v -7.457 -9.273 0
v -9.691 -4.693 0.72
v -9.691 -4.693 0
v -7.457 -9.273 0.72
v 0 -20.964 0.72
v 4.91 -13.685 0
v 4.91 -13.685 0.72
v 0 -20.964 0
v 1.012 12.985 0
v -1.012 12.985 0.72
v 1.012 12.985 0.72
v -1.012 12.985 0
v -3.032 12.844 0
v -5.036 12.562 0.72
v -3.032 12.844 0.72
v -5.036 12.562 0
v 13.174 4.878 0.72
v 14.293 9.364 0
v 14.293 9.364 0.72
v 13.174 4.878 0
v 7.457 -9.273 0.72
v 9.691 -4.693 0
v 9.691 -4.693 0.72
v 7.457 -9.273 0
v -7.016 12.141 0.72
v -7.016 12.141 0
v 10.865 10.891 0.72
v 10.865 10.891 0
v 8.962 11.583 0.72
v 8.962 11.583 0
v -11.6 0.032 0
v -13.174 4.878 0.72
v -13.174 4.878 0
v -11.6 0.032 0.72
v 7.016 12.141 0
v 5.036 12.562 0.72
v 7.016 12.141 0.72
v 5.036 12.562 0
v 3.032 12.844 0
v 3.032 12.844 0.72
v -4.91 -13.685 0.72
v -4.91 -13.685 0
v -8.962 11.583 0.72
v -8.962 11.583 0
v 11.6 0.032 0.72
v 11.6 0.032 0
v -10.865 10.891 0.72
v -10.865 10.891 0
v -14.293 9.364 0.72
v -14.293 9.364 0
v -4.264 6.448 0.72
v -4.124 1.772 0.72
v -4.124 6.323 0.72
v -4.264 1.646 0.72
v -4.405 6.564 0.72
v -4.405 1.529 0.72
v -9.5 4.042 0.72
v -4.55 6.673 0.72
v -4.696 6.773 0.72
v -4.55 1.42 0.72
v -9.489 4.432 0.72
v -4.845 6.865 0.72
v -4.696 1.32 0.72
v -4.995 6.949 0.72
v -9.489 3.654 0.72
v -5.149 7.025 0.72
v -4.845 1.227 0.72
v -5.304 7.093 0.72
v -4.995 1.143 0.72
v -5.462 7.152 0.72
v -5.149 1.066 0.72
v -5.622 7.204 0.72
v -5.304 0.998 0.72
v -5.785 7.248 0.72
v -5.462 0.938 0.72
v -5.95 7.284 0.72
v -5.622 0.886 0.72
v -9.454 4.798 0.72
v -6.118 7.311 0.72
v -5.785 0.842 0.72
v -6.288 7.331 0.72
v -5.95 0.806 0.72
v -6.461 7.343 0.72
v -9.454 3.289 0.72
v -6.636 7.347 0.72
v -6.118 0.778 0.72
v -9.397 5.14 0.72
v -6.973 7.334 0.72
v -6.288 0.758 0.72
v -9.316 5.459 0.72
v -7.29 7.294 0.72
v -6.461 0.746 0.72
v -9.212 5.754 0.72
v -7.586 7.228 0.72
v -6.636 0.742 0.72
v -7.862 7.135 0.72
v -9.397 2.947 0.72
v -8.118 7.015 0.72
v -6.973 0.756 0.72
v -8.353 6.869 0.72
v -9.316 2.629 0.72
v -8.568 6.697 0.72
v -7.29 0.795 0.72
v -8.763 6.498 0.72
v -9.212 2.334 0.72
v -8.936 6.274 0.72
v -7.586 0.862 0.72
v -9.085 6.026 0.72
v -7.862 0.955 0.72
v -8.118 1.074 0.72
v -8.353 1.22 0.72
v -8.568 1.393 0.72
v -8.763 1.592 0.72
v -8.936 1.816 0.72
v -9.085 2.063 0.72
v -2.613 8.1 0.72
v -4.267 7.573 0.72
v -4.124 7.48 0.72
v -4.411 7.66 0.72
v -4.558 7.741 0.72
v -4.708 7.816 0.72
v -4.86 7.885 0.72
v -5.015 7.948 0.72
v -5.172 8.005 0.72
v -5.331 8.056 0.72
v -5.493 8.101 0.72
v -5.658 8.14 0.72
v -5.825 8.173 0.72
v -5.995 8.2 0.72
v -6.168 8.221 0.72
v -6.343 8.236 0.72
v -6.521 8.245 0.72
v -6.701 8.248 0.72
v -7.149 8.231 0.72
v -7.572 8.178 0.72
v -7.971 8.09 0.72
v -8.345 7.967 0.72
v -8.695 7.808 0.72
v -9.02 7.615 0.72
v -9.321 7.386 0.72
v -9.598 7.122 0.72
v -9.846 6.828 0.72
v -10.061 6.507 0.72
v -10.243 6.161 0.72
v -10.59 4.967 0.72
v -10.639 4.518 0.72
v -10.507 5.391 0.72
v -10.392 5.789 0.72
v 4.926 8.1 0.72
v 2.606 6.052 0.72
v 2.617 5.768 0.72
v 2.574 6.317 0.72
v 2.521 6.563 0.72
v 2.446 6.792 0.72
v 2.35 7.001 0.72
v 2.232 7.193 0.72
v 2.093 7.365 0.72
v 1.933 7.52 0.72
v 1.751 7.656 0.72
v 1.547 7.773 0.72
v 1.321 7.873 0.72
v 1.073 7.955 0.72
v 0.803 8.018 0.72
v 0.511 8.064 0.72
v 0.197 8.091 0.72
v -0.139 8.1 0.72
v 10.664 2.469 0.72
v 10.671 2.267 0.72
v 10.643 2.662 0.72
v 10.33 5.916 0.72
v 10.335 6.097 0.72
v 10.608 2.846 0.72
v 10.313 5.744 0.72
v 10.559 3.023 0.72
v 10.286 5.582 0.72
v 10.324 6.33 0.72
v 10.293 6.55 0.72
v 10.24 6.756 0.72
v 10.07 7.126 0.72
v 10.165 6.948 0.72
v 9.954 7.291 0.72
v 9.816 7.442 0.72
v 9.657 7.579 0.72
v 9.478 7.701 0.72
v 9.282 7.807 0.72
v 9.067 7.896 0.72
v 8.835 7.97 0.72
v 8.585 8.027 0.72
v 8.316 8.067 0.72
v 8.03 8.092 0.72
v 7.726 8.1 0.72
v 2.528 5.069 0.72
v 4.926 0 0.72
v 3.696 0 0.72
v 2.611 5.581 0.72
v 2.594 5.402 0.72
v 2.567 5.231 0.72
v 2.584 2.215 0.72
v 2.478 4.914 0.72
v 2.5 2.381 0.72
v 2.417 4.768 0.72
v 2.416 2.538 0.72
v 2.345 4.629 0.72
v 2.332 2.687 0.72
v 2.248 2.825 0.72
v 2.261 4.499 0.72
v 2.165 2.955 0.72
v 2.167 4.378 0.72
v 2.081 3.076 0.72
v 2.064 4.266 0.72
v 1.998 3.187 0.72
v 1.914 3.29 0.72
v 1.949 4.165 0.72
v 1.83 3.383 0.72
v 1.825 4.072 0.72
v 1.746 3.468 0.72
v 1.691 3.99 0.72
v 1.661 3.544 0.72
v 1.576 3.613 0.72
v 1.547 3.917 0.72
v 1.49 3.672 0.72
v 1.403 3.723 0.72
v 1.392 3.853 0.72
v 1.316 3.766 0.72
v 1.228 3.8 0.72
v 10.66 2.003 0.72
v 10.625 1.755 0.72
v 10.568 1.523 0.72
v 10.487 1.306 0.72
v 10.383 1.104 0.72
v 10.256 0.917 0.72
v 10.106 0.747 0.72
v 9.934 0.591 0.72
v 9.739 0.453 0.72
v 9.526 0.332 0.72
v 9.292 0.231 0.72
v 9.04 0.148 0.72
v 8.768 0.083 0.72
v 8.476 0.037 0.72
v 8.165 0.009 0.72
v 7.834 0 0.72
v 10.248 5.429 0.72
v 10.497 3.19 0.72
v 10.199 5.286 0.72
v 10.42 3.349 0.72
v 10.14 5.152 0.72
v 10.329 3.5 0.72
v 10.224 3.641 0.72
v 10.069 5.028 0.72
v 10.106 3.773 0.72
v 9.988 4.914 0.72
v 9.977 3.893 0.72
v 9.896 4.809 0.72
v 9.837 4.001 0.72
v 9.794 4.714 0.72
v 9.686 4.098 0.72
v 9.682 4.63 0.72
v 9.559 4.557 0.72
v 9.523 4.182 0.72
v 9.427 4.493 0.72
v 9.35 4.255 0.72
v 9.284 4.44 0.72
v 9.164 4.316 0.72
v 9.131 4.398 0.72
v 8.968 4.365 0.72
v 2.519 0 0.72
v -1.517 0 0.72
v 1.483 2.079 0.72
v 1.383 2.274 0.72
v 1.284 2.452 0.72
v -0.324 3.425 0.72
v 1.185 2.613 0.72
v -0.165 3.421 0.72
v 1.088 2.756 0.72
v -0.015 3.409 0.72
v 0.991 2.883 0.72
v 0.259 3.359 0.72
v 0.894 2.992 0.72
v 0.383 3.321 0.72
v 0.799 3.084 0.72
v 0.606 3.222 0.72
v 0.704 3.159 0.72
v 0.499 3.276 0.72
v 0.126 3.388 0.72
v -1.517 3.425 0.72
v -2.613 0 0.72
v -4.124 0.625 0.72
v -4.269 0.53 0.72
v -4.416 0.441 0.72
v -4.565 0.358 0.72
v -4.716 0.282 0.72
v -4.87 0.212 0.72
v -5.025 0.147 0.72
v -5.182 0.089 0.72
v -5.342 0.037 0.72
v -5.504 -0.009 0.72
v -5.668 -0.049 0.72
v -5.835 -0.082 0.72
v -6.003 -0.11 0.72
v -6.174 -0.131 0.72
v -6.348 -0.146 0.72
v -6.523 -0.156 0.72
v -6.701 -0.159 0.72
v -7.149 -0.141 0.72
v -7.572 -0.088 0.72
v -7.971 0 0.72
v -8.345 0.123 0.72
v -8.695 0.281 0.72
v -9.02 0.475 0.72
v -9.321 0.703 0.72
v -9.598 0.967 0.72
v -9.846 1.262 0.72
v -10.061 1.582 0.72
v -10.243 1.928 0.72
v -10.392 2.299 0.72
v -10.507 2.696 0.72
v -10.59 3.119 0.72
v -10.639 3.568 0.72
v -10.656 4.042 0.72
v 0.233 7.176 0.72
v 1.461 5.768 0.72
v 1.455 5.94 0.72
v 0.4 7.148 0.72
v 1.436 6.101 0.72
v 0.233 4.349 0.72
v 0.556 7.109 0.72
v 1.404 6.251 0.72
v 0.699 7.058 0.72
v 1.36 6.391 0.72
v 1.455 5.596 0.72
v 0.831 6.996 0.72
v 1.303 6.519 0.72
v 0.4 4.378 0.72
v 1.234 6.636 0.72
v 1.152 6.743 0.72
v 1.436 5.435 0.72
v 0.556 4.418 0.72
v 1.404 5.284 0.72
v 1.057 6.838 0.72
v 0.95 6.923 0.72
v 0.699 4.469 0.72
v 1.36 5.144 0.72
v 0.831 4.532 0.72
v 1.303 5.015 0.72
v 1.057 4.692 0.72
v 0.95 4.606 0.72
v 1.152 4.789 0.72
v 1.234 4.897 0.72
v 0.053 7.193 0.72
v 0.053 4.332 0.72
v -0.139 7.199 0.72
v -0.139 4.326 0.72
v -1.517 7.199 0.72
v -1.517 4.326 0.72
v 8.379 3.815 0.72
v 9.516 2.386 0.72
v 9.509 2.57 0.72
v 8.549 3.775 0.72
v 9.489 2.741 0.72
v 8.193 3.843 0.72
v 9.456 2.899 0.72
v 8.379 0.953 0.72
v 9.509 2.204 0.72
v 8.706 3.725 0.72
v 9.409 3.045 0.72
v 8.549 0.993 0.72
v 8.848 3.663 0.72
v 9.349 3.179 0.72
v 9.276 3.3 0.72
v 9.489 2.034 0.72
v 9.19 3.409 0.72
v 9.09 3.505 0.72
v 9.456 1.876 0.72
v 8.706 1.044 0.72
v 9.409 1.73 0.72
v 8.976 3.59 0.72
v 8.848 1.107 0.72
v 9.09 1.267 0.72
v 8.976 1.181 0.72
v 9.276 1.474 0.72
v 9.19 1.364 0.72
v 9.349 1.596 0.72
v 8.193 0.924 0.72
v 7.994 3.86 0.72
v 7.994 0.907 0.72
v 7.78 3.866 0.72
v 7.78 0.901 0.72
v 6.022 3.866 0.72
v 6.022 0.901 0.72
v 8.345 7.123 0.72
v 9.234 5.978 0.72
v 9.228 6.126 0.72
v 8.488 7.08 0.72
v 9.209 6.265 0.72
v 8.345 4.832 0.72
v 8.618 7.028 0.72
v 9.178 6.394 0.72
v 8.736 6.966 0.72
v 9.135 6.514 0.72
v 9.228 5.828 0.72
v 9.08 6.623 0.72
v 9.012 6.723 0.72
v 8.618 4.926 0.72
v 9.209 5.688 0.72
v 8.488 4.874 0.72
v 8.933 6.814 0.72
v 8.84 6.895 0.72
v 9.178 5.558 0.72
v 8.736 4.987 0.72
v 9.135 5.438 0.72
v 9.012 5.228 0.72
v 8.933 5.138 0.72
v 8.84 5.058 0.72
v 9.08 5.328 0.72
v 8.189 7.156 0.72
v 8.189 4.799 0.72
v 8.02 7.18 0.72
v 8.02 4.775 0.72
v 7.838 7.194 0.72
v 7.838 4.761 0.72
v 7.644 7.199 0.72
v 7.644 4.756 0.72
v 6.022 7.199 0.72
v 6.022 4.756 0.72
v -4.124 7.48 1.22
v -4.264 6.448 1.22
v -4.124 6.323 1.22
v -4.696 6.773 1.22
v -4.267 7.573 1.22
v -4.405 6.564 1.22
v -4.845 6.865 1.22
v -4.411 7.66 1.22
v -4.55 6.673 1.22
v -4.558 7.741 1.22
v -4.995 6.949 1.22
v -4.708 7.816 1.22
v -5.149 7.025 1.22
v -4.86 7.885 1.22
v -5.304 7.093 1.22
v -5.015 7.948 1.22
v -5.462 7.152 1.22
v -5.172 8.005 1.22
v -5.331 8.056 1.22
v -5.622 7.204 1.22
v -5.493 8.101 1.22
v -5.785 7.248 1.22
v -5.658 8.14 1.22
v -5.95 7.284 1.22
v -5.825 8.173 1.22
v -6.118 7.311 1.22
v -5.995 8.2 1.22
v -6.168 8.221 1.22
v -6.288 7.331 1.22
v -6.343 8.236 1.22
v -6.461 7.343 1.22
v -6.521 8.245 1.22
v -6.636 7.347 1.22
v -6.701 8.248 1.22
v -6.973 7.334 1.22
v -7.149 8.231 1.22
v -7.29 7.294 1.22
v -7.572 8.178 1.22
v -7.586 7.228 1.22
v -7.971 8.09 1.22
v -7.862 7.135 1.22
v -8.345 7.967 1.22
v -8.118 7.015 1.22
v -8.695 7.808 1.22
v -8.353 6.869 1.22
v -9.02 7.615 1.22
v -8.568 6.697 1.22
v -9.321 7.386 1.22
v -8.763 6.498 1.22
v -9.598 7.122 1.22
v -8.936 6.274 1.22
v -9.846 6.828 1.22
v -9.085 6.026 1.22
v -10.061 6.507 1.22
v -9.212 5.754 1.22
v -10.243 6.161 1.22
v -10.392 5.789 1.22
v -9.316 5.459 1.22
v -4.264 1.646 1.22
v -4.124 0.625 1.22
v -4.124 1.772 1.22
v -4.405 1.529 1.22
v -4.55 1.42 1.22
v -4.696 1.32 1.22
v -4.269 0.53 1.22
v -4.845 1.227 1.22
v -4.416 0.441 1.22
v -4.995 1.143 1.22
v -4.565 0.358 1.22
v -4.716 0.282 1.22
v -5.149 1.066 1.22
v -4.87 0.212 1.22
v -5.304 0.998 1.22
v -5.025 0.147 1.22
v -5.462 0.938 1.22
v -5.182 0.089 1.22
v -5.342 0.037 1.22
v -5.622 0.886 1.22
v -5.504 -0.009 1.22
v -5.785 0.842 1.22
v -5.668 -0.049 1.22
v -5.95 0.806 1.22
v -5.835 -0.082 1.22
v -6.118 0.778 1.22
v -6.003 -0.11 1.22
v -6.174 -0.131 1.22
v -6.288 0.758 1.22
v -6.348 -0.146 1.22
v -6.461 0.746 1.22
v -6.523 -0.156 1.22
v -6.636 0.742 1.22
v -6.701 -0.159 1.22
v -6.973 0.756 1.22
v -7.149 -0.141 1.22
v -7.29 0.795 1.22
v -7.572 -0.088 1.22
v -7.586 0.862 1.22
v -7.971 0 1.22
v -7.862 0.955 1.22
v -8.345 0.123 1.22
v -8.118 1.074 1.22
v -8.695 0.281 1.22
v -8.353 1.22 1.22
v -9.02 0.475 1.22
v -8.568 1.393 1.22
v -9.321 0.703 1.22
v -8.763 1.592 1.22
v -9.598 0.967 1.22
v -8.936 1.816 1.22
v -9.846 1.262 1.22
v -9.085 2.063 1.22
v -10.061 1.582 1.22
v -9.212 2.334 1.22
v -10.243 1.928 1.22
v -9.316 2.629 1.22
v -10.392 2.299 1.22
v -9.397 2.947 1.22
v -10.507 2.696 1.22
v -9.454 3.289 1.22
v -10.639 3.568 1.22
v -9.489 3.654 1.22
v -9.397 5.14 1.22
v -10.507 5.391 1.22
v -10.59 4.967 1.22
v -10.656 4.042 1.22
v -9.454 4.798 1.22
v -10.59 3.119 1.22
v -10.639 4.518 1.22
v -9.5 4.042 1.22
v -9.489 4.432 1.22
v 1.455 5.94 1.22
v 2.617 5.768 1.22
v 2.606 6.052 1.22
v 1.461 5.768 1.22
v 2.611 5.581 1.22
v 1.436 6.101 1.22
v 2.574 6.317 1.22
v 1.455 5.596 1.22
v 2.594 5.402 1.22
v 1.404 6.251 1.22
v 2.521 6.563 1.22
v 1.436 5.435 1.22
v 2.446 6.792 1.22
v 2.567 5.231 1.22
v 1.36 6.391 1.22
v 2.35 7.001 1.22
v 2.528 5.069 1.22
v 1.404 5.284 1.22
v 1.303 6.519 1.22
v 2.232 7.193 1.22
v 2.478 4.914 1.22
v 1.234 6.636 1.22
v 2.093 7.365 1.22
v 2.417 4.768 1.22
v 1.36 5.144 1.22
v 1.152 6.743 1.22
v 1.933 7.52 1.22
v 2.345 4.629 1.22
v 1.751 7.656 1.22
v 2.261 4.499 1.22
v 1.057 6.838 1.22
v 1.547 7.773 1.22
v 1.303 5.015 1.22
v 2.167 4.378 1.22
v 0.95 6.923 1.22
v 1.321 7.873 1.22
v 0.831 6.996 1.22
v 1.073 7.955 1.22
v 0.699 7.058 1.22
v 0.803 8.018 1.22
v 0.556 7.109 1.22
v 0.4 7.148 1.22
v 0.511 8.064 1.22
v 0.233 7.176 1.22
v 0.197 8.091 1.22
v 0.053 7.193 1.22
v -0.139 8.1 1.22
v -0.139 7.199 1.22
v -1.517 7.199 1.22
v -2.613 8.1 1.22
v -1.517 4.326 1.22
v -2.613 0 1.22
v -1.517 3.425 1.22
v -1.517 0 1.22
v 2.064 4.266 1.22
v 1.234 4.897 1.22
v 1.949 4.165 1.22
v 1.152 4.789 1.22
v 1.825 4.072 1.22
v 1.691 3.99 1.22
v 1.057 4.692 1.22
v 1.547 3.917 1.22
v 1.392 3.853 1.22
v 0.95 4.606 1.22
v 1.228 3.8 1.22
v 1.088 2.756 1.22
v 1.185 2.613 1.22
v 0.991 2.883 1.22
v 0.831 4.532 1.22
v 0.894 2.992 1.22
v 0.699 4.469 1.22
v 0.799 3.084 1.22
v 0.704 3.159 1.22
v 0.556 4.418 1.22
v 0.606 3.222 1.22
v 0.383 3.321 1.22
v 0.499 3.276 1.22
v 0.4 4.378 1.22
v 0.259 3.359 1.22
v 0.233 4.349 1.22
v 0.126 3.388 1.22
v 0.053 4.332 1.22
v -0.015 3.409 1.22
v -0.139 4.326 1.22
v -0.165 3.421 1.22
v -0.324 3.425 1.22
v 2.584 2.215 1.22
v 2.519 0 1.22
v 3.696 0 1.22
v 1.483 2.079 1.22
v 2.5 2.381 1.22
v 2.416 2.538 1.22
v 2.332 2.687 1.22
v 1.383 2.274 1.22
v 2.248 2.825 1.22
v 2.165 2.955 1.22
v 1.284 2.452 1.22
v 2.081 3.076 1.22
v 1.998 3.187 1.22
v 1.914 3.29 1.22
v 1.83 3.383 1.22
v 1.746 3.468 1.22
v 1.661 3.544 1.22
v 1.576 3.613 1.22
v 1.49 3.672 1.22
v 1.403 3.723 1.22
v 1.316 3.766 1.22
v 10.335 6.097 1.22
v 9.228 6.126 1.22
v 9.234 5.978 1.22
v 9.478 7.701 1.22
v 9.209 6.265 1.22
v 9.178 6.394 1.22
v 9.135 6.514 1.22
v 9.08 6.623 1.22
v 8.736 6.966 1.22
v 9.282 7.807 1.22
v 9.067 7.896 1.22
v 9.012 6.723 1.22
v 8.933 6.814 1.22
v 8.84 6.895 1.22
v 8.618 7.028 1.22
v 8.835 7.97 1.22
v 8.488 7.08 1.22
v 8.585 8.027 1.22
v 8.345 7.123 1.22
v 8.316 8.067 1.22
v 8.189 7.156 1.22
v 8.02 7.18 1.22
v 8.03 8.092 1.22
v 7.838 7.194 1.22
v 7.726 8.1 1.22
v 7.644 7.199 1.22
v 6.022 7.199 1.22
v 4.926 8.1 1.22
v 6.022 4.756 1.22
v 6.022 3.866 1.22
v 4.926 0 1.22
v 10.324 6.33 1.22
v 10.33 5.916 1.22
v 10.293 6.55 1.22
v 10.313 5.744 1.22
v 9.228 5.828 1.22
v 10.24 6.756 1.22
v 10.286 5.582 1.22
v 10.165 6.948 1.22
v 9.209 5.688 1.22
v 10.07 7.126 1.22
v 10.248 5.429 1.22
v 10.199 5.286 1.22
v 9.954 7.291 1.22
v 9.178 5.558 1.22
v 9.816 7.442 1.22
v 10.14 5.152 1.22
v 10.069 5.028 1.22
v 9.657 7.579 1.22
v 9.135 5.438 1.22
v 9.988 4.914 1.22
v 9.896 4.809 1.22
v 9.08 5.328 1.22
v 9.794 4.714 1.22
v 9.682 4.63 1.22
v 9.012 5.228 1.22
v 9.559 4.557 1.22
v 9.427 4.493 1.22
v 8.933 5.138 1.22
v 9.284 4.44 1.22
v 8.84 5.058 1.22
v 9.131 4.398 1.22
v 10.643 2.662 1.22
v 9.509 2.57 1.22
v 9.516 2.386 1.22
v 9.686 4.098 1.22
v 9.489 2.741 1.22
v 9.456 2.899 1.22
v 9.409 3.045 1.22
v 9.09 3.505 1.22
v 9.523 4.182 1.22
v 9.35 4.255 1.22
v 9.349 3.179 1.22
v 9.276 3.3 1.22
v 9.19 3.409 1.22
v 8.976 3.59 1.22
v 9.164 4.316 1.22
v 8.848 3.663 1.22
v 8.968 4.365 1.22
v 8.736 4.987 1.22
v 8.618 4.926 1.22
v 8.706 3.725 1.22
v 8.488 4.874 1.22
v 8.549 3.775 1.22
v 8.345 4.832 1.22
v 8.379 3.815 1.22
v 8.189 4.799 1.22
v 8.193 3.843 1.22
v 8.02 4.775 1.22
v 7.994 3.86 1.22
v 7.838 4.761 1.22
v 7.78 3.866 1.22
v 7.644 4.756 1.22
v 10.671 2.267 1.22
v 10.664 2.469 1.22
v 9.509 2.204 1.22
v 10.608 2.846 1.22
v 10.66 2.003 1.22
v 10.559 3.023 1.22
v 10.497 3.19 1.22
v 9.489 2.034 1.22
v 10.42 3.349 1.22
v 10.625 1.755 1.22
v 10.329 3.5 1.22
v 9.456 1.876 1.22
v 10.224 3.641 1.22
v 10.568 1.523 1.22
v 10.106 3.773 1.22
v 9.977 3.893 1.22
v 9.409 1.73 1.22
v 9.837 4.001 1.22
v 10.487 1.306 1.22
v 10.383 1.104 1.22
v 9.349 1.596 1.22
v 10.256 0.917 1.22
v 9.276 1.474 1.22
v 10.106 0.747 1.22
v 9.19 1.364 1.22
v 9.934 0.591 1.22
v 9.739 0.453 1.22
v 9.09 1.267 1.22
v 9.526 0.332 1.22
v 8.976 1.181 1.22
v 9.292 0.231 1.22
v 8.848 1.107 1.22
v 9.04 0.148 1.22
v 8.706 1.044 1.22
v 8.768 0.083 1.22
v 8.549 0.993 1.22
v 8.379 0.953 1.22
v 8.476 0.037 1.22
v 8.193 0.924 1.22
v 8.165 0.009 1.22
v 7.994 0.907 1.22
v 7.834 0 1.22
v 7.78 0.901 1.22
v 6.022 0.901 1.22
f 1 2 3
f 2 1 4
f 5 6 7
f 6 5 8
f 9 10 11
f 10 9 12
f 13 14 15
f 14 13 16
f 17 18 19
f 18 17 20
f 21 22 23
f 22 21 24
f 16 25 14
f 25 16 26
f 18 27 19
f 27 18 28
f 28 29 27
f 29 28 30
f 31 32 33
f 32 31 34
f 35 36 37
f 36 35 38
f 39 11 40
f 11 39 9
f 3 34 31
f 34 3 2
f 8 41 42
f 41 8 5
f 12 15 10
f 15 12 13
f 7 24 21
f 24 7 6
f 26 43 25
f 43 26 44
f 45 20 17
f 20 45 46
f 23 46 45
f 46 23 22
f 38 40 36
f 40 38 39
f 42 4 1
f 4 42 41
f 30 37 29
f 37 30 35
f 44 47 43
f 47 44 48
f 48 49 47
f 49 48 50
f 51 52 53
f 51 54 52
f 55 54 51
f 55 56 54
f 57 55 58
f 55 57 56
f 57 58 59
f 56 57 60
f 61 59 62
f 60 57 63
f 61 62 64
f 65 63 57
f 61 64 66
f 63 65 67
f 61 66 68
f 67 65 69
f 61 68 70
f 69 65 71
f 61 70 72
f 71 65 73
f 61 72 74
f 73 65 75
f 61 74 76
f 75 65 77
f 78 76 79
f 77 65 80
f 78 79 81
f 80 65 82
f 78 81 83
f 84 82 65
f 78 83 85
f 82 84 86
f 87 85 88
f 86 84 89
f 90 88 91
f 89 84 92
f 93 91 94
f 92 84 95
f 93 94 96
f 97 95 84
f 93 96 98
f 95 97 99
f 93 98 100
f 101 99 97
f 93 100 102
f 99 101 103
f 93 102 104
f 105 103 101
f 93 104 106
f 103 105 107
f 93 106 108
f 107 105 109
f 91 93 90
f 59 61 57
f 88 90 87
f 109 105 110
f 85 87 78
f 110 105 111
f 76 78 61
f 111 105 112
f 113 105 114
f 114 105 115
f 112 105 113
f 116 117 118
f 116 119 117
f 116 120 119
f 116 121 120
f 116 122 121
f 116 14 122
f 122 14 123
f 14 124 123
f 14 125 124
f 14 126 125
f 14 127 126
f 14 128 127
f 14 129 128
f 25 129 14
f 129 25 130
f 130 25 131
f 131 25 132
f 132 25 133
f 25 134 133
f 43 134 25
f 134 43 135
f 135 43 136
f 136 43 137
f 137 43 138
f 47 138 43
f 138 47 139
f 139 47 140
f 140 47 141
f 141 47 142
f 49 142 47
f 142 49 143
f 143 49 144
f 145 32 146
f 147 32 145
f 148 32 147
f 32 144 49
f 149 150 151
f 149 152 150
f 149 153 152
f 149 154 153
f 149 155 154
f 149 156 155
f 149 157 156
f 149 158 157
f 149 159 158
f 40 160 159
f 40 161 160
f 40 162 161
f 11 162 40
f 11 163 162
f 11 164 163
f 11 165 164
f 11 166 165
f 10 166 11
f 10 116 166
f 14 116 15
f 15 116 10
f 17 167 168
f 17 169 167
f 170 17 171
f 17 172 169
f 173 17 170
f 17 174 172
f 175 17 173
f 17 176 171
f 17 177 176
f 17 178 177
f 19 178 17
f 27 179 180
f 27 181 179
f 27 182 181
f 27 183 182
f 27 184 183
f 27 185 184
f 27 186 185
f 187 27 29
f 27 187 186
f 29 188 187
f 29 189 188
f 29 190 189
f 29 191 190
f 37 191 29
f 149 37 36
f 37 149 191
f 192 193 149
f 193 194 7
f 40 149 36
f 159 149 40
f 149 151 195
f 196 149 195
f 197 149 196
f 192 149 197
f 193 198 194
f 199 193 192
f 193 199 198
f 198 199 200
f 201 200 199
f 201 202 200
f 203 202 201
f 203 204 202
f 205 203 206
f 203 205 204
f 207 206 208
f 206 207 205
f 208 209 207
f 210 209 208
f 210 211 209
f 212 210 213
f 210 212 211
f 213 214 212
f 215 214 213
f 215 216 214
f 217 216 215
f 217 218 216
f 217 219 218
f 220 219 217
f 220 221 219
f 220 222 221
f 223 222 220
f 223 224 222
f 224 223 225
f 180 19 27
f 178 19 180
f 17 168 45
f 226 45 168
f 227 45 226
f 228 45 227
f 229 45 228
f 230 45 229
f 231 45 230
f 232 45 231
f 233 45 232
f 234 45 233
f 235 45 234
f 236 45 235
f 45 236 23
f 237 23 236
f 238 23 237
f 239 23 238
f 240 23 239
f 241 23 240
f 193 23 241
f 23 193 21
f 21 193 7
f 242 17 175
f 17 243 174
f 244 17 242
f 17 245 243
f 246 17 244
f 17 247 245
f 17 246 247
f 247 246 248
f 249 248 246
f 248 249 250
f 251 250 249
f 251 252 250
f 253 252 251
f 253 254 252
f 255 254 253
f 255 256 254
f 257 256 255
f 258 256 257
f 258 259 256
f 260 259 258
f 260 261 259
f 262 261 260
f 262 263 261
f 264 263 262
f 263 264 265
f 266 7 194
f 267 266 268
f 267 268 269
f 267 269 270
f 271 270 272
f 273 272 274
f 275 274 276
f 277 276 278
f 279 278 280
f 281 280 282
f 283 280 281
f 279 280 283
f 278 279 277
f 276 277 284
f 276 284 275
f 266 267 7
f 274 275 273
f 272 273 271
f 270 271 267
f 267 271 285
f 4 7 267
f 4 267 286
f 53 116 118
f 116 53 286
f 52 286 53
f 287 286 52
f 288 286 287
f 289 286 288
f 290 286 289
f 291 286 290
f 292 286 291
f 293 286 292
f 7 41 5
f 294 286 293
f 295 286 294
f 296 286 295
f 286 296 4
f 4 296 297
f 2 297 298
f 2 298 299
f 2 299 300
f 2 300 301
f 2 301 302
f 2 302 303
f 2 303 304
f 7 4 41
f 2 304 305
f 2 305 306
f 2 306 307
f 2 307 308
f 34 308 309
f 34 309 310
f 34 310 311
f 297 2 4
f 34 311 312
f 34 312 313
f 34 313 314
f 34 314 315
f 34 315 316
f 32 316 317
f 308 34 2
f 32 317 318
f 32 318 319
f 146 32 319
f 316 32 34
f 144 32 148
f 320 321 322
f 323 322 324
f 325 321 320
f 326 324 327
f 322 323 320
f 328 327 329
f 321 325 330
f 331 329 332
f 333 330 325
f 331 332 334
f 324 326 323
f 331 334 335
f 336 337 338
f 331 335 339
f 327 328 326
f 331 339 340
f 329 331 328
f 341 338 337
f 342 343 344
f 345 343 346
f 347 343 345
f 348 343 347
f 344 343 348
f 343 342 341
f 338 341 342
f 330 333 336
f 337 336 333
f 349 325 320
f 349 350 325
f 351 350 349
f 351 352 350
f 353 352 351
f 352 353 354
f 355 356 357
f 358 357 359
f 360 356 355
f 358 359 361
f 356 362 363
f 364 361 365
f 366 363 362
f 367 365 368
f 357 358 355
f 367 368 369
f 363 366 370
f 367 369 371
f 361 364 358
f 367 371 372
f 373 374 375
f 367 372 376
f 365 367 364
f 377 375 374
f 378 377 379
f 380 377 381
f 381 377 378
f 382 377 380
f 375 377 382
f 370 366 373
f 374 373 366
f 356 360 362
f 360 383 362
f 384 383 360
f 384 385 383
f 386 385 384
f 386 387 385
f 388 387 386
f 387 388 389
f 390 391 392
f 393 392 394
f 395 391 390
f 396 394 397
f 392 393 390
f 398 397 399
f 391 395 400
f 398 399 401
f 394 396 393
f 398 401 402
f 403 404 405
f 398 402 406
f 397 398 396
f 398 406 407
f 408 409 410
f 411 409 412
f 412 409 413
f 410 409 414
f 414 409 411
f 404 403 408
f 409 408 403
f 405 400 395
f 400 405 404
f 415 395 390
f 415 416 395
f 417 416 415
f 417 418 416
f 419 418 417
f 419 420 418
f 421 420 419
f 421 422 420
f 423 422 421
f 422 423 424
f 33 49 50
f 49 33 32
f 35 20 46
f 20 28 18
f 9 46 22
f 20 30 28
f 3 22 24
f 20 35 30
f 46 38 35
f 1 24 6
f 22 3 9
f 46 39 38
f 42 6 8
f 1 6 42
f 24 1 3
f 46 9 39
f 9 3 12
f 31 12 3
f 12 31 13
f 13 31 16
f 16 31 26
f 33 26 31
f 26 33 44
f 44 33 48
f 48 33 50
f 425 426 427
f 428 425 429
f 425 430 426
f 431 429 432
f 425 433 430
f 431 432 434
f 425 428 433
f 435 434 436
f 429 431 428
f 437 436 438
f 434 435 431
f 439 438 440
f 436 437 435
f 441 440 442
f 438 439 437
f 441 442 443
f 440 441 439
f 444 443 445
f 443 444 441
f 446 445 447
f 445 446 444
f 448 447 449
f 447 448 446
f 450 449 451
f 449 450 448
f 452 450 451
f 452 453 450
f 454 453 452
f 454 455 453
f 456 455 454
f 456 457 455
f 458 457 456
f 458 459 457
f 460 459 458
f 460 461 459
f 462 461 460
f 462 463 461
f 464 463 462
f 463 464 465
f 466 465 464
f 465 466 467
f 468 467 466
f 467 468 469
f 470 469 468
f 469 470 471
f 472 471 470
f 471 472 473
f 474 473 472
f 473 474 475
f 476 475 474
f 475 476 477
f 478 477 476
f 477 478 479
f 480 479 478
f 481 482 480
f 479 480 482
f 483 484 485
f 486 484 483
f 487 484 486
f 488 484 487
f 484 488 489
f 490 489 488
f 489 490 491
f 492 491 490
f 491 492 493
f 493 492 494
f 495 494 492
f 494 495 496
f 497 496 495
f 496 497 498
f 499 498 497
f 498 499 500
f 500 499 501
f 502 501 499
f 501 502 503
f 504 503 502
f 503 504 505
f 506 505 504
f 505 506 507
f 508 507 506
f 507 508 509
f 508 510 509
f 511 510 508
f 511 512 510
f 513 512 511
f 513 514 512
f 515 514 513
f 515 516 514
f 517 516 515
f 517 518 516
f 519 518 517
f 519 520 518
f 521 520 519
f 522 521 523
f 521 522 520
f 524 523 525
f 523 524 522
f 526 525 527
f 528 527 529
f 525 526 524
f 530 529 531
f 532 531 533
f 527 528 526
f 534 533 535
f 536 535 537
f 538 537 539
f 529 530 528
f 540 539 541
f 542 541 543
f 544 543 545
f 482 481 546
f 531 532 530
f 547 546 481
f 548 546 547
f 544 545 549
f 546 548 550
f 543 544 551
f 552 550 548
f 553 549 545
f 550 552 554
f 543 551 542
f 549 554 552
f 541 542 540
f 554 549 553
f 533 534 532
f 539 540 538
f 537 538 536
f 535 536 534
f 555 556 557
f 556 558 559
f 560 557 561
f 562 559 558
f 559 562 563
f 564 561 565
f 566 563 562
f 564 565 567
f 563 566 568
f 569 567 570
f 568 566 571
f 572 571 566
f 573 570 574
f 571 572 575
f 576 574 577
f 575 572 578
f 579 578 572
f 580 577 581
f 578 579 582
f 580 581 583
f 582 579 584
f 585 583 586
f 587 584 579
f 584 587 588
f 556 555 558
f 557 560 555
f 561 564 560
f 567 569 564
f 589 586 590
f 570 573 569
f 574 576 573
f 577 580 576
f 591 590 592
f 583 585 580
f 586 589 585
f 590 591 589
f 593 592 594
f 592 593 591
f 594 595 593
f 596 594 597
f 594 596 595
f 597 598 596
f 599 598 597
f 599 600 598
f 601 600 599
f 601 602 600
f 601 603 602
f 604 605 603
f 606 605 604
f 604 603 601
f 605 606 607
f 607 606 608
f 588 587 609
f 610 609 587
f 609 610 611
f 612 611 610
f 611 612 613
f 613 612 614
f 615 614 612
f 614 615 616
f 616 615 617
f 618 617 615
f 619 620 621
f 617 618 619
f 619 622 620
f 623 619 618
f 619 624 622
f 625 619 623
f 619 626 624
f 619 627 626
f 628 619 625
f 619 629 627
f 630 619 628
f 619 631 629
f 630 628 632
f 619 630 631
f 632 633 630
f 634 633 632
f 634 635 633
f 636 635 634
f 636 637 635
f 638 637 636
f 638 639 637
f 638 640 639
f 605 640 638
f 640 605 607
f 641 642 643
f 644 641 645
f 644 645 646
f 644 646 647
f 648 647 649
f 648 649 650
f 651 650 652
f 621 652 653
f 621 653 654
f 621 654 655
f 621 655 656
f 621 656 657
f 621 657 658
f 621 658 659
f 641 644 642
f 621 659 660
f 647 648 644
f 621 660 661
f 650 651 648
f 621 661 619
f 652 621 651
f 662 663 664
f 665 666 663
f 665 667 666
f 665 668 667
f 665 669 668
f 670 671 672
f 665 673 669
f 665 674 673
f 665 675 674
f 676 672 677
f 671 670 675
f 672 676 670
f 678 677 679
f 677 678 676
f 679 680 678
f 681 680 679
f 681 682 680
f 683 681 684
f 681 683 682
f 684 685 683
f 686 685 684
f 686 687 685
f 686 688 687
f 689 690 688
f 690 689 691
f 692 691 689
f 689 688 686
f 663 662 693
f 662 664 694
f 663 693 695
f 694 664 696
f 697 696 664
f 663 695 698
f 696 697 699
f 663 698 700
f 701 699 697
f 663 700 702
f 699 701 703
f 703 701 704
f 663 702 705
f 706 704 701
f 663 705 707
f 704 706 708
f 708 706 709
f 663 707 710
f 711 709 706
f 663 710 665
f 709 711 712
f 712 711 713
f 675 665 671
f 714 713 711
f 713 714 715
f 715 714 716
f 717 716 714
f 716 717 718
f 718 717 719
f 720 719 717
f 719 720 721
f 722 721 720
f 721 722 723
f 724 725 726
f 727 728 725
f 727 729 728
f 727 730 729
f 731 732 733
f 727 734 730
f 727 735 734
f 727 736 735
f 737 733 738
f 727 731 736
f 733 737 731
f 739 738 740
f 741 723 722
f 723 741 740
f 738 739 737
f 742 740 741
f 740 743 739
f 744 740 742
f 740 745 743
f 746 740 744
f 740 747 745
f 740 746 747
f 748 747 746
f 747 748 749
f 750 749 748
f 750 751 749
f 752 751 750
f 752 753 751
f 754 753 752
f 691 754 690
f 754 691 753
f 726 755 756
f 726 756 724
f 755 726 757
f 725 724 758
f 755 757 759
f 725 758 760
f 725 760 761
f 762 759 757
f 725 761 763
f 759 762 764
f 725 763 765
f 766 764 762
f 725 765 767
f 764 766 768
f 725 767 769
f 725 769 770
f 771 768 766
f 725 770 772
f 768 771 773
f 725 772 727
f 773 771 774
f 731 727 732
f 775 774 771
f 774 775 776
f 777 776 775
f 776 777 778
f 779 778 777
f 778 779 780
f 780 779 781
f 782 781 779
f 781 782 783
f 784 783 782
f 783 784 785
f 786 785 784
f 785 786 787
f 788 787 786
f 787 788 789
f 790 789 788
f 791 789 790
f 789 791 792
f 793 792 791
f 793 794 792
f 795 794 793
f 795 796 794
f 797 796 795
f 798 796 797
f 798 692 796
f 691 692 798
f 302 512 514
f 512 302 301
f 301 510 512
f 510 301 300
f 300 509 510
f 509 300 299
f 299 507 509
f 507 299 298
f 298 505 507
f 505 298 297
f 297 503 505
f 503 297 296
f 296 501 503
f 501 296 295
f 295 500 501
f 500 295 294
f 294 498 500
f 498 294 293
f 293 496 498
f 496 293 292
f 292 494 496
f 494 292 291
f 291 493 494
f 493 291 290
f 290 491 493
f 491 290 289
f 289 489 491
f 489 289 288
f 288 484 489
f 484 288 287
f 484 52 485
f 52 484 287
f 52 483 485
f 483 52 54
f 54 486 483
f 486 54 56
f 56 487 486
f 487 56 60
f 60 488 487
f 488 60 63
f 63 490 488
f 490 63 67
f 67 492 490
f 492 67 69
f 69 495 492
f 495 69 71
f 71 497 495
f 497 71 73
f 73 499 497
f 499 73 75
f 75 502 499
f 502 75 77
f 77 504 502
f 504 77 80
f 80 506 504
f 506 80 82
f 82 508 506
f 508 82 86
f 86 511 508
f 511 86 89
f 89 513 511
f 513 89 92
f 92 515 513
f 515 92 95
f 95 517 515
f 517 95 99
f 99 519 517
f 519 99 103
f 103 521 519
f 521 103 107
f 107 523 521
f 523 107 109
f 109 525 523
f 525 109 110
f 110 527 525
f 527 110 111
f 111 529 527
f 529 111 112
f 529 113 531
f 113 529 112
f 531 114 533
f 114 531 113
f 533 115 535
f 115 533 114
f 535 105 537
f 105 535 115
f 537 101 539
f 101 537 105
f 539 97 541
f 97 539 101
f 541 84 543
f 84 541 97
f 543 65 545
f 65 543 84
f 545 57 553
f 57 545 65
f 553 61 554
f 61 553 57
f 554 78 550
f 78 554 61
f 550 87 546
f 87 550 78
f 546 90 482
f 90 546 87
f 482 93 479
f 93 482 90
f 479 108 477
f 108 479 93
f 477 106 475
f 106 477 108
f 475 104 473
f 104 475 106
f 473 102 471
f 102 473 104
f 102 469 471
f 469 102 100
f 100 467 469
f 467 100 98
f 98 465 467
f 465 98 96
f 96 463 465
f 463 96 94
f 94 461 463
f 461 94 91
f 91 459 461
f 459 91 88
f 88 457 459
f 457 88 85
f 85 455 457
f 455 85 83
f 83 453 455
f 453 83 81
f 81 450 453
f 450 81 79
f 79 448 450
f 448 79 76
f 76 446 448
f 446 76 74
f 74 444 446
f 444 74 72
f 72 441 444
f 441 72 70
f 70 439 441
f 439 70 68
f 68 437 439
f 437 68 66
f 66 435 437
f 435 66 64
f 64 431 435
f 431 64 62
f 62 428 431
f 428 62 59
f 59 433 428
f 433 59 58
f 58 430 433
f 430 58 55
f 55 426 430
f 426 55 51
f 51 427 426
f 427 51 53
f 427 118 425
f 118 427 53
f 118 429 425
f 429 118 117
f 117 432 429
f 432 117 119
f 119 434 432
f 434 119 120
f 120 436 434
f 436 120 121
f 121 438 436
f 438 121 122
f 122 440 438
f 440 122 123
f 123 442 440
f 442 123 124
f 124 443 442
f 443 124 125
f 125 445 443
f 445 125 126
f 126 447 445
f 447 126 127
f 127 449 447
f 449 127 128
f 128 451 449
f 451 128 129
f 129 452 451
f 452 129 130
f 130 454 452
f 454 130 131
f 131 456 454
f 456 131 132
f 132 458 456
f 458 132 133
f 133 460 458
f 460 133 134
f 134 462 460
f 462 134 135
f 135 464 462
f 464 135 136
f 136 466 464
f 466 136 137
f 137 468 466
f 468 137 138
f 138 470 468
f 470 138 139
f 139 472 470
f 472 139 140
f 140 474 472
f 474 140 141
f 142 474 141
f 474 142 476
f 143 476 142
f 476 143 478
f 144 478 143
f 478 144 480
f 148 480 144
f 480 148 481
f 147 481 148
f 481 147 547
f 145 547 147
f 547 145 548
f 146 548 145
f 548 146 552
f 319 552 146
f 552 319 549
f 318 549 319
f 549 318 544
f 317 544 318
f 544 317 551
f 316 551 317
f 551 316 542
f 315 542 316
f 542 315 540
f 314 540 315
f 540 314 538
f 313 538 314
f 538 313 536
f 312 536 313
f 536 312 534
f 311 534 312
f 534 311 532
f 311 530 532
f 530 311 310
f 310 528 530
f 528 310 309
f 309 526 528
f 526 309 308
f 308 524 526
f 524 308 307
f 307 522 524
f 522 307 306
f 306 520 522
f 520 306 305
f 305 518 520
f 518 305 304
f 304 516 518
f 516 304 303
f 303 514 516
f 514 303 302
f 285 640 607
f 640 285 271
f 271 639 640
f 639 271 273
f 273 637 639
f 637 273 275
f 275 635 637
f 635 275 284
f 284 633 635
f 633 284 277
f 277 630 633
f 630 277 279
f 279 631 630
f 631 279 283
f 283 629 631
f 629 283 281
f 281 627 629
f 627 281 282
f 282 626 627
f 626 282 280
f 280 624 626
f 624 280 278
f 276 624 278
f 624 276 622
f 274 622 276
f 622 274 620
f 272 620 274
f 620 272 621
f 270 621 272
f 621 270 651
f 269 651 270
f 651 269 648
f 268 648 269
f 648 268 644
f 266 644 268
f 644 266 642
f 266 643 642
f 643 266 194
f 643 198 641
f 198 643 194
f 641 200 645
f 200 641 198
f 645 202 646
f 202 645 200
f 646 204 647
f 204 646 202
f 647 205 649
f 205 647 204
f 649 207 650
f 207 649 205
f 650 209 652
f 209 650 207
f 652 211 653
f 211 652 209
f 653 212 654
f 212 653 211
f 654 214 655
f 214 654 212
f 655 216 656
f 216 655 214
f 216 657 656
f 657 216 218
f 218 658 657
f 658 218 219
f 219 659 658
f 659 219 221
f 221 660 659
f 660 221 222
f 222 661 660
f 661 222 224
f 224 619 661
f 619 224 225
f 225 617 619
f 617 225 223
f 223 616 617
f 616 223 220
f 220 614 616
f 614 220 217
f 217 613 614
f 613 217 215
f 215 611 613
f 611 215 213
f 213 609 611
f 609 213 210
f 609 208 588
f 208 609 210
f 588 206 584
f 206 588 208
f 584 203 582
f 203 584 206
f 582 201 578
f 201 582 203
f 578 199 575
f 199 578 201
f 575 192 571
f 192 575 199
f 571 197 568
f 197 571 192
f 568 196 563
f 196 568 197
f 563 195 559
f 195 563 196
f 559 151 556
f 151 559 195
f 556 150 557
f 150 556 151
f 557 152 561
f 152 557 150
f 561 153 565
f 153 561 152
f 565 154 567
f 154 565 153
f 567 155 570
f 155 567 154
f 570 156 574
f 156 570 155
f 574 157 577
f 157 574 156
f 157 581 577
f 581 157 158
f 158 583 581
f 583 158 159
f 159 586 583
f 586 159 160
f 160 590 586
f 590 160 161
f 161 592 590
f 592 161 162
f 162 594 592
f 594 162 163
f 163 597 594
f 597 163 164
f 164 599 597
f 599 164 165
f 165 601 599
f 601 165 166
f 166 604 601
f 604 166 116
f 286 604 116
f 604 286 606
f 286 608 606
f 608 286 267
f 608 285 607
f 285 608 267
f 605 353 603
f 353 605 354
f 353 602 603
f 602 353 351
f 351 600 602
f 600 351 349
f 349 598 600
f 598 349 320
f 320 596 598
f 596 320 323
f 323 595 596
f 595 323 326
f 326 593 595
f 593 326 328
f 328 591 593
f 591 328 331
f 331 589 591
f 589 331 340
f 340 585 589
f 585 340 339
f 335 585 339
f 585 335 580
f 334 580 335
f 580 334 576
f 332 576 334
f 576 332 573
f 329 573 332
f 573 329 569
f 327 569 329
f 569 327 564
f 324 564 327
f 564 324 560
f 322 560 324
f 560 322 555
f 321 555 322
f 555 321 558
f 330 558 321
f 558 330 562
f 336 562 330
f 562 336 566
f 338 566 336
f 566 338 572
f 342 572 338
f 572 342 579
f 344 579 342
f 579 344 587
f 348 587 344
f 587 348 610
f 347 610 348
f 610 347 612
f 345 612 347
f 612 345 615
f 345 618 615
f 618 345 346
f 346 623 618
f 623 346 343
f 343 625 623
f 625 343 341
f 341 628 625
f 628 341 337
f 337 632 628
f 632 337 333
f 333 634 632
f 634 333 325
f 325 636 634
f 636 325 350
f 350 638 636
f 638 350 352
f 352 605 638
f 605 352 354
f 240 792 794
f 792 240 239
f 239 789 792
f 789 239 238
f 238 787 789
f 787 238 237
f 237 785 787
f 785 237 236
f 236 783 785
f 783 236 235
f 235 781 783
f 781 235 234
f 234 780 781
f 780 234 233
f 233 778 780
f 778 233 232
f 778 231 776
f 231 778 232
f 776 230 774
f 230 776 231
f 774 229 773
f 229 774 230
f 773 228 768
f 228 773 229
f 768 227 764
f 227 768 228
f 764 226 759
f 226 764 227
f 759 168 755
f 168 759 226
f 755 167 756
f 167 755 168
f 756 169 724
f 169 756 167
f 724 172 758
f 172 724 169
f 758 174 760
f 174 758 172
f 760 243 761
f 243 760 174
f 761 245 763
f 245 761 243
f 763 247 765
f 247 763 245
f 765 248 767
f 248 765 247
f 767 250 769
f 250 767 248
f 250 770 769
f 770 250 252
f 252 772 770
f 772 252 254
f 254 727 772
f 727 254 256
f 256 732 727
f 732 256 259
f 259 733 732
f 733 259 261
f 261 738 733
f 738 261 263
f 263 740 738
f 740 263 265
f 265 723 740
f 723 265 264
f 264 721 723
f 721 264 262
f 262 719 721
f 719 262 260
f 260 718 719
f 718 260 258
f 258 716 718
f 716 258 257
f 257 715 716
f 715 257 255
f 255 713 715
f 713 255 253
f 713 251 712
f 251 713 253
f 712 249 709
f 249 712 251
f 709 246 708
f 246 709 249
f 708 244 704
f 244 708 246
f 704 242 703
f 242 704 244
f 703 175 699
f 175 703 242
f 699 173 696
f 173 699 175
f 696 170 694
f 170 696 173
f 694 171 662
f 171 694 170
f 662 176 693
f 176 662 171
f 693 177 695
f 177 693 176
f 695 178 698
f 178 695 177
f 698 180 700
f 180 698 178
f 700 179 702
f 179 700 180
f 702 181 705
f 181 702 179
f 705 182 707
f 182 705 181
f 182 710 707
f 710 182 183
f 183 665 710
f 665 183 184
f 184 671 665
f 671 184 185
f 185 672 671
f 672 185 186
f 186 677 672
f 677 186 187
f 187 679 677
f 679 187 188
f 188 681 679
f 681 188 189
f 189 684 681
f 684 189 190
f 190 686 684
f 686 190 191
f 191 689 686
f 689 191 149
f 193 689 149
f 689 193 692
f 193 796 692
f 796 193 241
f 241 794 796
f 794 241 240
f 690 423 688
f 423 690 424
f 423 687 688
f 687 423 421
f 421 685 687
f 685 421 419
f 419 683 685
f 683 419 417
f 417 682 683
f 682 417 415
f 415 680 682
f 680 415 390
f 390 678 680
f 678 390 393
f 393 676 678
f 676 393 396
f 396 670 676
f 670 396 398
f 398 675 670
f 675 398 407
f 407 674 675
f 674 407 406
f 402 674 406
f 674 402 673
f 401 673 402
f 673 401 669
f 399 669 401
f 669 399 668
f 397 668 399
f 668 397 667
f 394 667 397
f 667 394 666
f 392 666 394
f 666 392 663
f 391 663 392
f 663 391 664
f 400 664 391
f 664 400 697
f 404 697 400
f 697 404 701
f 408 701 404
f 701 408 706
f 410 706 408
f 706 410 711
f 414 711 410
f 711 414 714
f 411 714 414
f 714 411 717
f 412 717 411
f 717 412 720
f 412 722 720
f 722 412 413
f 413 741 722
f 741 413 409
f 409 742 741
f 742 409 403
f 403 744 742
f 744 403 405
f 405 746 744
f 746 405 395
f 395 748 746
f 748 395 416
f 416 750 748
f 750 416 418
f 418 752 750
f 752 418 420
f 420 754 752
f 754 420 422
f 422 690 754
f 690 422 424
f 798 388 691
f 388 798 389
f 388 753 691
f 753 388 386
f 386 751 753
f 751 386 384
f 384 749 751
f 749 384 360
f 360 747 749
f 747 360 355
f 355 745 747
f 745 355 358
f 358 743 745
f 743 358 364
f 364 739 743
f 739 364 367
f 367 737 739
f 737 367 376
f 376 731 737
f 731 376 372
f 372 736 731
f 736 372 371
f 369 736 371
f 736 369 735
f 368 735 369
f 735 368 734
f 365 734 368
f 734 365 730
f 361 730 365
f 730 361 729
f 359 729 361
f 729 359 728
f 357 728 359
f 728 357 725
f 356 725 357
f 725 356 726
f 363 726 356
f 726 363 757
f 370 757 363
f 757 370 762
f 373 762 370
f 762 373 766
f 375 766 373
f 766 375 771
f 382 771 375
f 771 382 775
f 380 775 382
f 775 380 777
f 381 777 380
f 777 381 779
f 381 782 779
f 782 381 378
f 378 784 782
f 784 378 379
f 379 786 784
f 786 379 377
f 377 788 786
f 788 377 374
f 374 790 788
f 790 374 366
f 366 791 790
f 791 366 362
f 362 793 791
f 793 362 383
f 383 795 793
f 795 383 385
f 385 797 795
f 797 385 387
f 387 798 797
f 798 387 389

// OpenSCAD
$fs=0.8; // def 1, 0.2 is high res
$fa=4;//def 12, 3 is very nice
%translate([0,0,-0.5])cube([200,200,1],center=true); //build platform

//CUSTOMIZER VARIABLES

// This section is displays the box options
// Pick Thickness 
z_thick = 0.72;	//	[1:Extra Lite, 1.5:Lite, 1.875:Medium, 2.5:Heavy, 3.75:Extra Heavy, 4.375:Extreme!]

//AdvancedGrip Technology
Grip = 0; // [1:Yes, 0:No]

//CUSTOMIZER VARIABLES END

module grip() {
	//TOP GRIP
	translate([0,0,-1.61]) {
		difference() {
			translate([0,23,2])
				intersection() {
					translate([-51,0,0]) cylinder(.2,67,66);
					translate([51,0,0]) cylinder(.2,67,66);
					translate([0,-38,0]) cylinder(.2,25,24);
				}
			translate([0,-15,0]) cylinder(3,16,25);
		}
	}
	//BOTTOM GRIP
	translate([0,-4,-1.61]) {
		difference() {
			translate([0,23,2])
				intersection() {
				translate([-51,0,0]) cylinder(.2,65,64);
				translate([51,0,0]) cylinder(.2,65,64);
				translate([0,-38,0]) cylinder(.2,23,22);
			}
			translate([0,-15,0]) cylinder(3,14,23);
		}
	}
}

module pick_shape(z_thick) {
	//error correct
	translate([0,25,0])
	linear_extrude(height = z_thick, twist = 0, slices = 3) {
	offset(delta = 4, join_type = "round") {
		intersection() {
			translate([-57,0,0]) circle(69);
			translate([57,0,0]) circle(69);
			translate([0,-41,0]) circle(25);
		}
	}
	}
}

//PickPerfect

color("darkorange") pick_shape(z_thick);
if(Grip==1){
	color("gold") grip();
}
translate([0,-0,.5])linear_extrude(height = z_thick, slices = 3) {
	 text("CRB", font = "Racing Sans One", size = 8, halign = "center");
}
